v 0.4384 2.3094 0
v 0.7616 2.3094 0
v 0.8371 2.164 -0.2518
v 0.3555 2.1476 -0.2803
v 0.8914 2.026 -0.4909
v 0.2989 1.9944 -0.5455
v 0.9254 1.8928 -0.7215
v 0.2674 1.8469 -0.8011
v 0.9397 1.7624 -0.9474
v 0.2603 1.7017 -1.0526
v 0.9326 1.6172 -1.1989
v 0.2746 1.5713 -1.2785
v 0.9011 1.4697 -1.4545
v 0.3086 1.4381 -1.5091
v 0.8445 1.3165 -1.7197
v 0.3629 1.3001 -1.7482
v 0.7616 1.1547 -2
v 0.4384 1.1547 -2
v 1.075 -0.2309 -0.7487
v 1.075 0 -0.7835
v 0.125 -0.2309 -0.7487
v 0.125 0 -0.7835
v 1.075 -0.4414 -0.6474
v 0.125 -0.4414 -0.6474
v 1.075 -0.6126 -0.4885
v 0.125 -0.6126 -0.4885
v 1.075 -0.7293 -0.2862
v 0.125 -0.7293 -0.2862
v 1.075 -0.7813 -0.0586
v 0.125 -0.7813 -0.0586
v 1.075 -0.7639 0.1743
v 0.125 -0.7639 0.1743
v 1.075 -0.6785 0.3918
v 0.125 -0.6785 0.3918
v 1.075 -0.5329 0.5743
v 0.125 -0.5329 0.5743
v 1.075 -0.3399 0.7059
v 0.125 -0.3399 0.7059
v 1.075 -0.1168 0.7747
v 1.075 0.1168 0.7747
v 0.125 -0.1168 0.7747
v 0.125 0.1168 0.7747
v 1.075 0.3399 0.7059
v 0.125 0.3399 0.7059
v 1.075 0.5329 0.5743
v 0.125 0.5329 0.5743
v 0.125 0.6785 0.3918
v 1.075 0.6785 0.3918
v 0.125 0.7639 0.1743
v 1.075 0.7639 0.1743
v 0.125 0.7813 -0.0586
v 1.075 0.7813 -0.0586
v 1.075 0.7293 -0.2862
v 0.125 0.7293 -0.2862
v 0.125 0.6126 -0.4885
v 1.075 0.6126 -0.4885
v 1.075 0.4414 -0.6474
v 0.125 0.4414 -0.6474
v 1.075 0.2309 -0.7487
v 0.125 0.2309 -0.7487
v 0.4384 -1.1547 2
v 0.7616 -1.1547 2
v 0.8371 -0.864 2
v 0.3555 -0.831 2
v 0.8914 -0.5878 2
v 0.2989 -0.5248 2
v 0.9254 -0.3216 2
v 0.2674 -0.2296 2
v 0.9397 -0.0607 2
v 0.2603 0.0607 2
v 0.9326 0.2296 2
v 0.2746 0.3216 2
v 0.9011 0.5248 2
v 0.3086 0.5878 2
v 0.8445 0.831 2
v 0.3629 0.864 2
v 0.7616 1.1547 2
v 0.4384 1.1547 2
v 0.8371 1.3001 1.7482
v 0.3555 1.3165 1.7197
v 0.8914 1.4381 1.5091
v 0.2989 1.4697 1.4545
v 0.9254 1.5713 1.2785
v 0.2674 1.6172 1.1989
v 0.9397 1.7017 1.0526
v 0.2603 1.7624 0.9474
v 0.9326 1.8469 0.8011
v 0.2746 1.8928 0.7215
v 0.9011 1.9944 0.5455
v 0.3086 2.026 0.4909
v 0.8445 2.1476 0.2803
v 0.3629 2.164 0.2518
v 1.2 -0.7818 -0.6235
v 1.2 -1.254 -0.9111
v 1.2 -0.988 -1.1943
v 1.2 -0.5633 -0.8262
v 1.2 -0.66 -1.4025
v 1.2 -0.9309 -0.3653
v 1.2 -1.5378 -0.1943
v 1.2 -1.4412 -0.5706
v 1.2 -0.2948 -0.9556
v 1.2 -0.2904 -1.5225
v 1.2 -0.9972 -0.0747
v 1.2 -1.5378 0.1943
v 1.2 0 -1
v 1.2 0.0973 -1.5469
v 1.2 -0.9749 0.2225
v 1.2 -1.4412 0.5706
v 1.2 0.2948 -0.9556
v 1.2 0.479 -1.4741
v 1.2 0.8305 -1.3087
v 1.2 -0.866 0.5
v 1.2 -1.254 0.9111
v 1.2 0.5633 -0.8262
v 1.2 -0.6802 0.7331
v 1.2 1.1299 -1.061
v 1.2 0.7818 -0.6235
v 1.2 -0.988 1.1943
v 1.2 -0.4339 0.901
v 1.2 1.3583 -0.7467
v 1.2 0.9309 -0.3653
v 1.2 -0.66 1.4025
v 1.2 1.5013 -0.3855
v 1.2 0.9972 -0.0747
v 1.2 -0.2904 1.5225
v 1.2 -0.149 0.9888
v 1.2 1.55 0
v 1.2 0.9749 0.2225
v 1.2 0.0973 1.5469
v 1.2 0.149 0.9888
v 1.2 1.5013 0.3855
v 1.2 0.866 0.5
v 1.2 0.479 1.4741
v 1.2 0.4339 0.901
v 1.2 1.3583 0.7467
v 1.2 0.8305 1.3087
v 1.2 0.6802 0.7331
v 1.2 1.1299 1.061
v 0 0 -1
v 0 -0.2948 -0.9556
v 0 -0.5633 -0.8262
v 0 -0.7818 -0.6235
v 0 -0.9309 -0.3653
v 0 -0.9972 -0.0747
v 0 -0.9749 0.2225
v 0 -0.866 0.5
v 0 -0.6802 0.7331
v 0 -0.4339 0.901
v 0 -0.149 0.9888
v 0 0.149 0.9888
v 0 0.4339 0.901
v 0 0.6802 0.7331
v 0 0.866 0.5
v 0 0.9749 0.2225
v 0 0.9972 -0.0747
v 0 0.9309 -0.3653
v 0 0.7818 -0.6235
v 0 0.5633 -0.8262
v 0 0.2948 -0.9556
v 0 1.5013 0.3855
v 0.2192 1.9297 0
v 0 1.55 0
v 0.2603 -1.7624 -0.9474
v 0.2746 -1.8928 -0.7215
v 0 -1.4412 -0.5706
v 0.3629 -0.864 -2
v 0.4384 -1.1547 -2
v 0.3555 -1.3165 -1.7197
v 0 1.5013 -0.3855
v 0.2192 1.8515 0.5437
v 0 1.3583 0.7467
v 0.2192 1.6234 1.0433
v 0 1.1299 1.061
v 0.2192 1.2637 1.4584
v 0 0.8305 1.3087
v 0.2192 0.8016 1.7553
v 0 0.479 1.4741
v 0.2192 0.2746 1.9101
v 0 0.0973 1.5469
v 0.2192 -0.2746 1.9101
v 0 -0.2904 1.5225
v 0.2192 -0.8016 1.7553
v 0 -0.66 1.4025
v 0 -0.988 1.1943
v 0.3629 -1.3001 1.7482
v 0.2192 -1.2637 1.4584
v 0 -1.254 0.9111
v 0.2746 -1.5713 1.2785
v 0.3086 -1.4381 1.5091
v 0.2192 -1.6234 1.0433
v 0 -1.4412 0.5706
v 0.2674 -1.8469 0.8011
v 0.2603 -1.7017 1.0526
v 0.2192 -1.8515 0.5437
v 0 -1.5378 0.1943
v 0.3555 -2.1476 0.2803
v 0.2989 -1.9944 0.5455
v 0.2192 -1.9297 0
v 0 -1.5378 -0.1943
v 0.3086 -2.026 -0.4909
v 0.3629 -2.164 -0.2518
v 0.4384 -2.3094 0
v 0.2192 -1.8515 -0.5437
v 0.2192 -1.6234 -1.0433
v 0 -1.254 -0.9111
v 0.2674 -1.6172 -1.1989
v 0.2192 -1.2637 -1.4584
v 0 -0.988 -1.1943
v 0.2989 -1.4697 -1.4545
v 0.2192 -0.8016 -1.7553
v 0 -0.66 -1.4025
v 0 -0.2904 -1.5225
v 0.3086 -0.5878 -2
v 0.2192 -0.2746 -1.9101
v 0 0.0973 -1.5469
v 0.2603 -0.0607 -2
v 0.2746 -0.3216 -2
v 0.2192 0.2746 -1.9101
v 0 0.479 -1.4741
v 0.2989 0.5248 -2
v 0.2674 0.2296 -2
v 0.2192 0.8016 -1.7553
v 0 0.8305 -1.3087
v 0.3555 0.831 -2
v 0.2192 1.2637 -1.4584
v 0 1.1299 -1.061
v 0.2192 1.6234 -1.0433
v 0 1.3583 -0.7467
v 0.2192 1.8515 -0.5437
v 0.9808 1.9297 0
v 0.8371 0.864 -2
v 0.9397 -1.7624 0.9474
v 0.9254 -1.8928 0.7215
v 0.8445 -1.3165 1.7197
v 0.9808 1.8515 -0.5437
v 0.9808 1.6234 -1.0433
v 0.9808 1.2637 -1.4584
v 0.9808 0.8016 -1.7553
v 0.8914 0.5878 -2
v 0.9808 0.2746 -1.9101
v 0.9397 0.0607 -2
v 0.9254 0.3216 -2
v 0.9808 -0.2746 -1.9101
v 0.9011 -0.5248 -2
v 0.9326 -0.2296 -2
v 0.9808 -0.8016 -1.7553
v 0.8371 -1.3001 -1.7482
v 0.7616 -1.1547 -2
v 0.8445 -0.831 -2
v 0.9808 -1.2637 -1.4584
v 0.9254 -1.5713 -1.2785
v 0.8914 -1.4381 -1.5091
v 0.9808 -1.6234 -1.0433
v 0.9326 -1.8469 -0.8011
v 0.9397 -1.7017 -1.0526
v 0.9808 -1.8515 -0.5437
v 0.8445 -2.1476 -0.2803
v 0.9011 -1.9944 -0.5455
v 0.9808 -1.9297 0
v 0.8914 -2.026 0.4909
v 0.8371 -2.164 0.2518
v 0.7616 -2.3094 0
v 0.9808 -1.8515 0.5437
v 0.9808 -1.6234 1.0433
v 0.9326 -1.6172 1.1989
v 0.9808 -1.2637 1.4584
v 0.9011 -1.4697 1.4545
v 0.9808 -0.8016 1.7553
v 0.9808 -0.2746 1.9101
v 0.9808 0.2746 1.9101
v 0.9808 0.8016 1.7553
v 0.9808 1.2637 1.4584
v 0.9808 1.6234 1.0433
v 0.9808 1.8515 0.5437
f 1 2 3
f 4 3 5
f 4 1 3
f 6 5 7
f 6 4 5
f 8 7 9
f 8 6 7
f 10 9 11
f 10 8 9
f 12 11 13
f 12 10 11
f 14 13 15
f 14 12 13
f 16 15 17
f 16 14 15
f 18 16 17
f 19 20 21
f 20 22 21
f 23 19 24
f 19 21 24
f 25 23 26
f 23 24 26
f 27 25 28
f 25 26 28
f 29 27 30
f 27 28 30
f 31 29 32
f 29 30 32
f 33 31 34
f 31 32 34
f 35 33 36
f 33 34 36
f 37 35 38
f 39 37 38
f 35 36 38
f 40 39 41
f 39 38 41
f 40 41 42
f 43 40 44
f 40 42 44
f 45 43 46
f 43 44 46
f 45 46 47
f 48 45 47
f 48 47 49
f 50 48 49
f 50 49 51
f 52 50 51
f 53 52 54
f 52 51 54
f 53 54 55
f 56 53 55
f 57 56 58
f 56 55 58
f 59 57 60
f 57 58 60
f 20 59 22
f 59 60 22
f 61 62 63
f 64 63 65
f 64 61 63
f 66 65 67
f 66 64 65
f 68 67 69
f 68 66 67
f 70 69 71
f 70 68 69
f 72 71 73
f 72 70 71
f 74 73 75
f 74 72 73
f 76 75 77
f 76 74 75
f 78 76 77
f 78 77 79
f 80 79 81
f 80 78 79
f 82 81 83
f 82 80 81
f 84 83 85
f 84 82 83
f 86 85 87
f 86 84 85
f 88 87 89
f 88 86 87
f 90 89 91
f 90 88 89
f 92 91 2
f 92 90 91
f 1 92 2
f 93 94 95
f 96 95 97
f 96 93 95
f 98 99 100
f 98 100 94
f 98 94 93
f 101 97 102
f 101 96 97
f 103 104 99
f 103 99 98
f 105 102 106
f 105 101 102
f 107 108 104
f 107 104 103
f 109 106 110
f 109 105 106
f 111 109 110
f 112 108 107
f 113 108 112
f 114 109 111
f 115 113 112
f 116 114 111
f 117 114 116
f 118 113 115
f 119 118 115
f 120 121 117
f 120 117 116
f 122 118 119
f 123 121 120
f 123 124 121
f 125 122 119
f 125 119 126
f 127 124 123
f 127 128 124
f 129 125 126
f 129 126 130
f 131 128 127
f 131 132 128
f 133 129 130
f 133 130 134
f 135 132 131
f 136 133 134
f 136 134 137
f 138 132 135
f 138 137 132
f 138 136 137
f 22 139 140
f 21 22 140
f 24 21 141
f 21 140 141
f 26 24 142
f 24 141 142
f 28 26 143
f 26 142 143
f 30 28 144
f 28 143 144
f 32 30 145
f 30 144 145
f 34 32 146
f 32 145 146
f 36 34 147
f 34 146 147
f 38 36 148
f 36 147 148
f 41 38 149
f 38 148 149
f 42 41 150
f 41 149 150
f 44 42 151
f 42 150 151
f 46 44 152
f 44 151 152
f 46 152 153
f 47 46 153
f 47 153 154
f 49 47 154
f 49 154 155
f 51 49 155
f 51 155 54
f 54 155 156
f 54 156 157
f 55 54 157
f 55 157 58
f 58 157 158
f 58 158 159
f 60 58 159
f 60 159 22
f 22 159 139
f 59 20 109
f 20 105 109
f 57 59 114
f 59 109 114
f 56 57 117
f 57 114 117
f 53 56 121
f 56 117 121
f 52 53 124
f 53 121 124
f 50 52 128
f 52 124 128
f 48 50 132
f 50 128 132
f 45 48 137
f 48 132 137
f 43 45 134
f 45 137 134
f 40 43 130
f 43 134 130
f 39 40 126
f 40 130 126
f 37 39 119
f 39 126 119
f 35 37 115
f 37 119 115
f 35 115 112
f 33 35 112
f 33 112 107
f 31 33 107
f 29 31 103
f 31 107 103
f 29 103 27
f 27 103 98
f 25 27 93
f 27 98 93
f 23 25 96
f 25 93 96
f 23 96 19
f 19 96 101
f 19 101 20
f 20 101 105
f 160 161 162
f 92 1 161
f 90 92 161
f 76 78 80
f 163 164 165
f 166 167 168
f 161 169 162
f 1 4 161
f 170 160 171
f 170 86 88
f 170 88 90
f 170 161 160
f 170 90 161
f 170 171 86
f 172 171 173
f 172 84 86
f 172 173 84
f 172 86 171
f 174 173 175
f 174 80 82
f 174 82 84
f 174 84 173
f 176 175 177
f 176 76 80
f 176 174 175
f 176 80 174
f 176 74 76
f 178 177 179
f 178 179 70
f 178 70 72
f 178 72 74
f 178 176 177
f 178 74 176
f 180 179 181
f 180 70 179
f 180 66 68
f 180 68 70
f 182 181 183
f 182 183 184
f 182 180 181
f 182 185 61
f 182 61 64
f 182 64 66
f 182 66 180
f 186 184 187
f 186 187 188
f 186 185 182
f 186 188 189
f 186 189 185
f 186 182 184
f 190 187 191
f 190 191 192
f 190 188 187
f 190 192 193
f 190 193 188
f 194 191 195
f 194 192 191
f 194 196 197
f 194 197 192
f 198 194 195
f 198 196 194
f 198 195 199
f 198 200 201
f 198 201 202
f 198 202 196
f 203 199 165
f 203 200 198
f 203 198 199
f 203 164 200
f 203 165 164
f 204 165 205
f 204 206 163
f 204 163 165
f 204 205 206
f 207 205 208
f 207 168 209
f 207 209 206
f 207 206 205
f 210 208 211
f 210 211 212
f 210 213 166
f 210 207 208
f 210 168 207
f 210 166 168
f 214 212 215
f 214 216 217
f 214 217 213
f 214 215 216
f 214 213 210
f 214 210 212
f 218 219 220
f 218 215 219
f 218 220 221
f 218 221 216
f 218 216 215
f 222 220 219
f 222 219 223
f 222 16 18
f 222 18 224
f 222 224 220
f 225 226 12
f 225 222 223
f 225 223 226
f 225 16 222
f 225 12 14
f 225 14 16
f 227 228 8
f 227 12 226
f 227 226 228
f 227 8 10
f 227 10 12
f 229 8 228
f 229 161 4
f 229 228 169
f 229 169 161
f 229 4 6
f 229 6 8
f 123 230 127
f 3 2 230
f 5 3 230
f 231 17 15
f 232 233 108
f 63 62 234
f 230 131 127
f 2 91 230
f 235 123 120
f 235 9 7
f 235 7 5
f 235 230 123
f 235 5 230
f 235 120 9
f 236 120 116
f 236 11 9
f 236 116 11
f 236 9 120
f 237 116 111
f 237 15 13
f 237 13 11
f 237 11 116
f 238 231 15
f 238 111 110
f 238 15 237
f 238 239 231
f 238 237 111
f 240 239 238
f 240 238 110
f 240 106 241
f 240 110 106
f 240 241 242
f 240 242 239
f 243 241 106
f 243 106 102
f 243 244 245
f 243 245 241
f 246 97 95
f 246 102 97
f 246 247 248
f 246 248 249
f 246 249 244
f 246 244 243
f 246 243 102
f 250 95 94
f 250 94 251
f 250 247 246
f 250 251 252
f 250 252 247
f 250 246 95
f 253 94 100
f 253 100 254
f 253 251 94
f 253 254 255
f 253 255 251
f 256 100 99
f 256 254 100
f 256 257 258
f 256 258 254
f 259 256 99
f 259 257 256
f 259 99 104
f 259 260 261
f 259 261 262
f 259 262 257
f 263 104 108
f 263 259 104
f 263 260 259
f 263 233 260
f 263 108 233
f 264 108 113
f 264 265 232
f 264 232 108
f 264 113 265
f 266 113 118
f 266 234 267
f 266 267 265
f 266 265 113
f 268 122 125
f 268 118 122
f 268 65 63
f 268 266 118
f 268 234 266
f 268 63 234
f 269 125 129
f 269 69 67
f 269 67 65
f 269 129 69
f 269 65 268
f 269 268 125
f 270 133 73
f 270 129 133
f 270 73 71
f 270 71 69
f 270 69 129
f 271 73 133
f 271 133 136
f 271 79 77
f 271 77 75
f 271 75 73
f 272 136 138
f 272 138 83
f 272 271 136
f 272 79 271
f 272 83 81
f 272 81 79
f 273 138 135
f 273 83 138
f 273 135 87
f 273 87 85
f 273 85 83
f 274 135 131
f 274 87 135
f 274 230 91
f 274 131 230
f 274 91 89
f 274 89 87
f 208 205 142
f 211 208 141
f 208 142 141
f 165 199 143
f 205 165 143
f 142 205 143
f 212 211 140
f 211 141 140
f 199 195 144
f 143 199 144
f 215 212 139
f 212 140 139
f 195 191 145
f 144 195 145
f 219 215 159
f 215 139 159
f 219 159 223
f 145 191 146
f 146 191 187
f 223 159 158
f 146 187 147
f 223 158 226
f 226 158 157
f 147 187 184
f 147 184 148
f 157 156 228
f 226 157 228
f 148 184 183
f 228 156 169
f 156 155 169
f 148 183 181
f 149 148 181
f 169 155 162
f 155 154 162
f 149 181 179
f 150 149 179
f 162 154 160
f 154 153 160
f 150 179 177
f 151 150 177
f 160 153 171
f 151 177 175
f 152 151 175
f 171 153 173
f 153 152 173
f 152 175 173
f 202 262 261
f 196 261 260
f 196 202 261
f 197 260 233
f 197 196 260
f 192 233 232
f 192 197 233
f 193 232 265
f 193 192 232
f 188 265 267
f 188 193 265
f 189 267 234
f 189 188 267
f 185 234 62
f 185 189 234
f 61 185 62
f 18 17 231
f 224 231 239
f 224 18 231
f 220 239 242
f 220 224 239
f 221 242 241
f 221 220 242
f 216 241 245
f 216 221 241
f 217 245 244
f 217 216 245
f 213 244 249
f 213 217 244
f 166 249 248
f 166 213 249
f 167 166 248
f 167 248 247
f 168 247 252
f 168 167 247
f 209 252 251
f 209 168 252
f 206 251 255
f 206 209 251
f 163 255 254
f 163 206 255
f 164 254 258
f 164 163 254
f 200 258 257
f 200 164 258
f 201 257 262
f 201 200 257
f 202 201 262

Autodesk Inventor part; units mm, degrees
ref_plane "YZ Plane" through (0, 0, 0) normal (1, 0, 0) x (0, 1, 0)
ref_plane "XZ Plane" through (0, 0, 0) normal (0, 1, 0) x (-1, 0, 0)
sketch "Sketch1" plane through (0, 0, 0) normal (1, 0, 0) x (0, 1, 0)
  line L0 (-2.3094, 0) -> (-1.1547, 2)
  line L1 (-1.1547, 2) -> (1.1547, 2)
  line L2 (1.1547, 2) -> (2.3094, 0)
  line L3 (2.3094, 0) -> (1.1547, -2)
  line L4 (1.1547, -2) -> (-1.1547, -2)
  line L5 (-1.1547, -2) -> (-2.3094, 0)
  point P0 (0, 0)
  point P1 (0, 0)
  dimension "d0" = 4.6188
extrude "Body" add sketch "Sketch1" along normal blind 1.2
sketch "Sketch2" plane through (0, 0, 0) normal (0, 0, 1) x (1, 0, 0)
  line L0 (0, 1.1547) -> (0, 2.3094) projected
  line L1 (0, 2.3094) -> (1.2, 2.3094) projected
  line L2 (1.2, 1.1547) -> (1.2, 2.3094) projected
  line L3 (-0.24, 0) -> (1.44, 0) projected
  line L4 (0.4384, 2.3094) -> (0, 1.55)
  line L5 (0.7616, 2.3094) -> (1.2, 1.55)
  dimension "d3" = 30
  dimension "d4" = 30
  dimension "d5" = 3.1
  dimension "d6" = 3.1
revolve "Chamfer1" cut sketch "Sketch2" angle 360 about axis through (-10, 0, 0) along (1, 0, 0)
sketch "Sketch3" plane through (1.2, 0, 0) normal (1, 0, 0) x (0, 0, -1)
  arc A0 (-0.625, -1.0825) -> (0.625, -1.0825) centre (0, 0) ccw projected
hole "Thread" at (1.2, 0, 0) direction (-1, 0, 0) diameter 1.567 end through all thread size "M2x0.4" class "6H" standard "ISO Metric profile"
chamfer "Chamfer2" distance 0.2165 angle 30 1 edges at (1.2, 0, 0.7835) measured on face at (1.2, 1.2776, -0.1551)
chamfer "Chamfer3" distance 0.2165 angle 30 1 edges at (0, 0, 0.7835) measured on face at (0, 1.2776, -0.1551)
ref_plane "Work Plane1" through (-5.0268, 0, 0) normal (0, -0.866, -0.5) x (1, 0, 0)
equation "\"d0\" = 1.1547 * SW"
equation "\"d1\" = KOH"
equation "\"d8\" = -0.5 * GD1 + 0.5 * NND"
equation "\"d40\" = -0.5 * GD1 + 0.5 * NND"
equation "\"d10\" = -0.5 * GD1 + 0.5 * NND"
equation "\"d41\" = -0.5 * GD1 + 0.5 * NND"
equation "\"d3\" = ANG1"
equation "\"d4\" = ANG2"
equation "\"d5\" = SW0"
equation "\"d6\" = SW01"
equation "\"ANG1\" = 30deg"
equation "\"ANG2\" = 30deg"
equation "\"NND\" = 2"
equation "\"KOH\" = 1.2"
equation "\"SW\" = 4"
equation "\"SW0\" = 3.1"
equation "\"SW01\" = SW0"
equation "\"GUL\" = 0.541266 * PTC"
equation "\"THREADDIA\" = 2"
equation "\"TOA\" = 30deg"
equation "\"PTC\" = 0.4"
equation "\"E0\" = 1.155 * SW"
equation "\"GAL\" = 0.541266 * PTC"
equation "\"GD1\" = 1.566987"
properties part number "ISO 4035 - M2" material "Stainless Steel, 440C"
